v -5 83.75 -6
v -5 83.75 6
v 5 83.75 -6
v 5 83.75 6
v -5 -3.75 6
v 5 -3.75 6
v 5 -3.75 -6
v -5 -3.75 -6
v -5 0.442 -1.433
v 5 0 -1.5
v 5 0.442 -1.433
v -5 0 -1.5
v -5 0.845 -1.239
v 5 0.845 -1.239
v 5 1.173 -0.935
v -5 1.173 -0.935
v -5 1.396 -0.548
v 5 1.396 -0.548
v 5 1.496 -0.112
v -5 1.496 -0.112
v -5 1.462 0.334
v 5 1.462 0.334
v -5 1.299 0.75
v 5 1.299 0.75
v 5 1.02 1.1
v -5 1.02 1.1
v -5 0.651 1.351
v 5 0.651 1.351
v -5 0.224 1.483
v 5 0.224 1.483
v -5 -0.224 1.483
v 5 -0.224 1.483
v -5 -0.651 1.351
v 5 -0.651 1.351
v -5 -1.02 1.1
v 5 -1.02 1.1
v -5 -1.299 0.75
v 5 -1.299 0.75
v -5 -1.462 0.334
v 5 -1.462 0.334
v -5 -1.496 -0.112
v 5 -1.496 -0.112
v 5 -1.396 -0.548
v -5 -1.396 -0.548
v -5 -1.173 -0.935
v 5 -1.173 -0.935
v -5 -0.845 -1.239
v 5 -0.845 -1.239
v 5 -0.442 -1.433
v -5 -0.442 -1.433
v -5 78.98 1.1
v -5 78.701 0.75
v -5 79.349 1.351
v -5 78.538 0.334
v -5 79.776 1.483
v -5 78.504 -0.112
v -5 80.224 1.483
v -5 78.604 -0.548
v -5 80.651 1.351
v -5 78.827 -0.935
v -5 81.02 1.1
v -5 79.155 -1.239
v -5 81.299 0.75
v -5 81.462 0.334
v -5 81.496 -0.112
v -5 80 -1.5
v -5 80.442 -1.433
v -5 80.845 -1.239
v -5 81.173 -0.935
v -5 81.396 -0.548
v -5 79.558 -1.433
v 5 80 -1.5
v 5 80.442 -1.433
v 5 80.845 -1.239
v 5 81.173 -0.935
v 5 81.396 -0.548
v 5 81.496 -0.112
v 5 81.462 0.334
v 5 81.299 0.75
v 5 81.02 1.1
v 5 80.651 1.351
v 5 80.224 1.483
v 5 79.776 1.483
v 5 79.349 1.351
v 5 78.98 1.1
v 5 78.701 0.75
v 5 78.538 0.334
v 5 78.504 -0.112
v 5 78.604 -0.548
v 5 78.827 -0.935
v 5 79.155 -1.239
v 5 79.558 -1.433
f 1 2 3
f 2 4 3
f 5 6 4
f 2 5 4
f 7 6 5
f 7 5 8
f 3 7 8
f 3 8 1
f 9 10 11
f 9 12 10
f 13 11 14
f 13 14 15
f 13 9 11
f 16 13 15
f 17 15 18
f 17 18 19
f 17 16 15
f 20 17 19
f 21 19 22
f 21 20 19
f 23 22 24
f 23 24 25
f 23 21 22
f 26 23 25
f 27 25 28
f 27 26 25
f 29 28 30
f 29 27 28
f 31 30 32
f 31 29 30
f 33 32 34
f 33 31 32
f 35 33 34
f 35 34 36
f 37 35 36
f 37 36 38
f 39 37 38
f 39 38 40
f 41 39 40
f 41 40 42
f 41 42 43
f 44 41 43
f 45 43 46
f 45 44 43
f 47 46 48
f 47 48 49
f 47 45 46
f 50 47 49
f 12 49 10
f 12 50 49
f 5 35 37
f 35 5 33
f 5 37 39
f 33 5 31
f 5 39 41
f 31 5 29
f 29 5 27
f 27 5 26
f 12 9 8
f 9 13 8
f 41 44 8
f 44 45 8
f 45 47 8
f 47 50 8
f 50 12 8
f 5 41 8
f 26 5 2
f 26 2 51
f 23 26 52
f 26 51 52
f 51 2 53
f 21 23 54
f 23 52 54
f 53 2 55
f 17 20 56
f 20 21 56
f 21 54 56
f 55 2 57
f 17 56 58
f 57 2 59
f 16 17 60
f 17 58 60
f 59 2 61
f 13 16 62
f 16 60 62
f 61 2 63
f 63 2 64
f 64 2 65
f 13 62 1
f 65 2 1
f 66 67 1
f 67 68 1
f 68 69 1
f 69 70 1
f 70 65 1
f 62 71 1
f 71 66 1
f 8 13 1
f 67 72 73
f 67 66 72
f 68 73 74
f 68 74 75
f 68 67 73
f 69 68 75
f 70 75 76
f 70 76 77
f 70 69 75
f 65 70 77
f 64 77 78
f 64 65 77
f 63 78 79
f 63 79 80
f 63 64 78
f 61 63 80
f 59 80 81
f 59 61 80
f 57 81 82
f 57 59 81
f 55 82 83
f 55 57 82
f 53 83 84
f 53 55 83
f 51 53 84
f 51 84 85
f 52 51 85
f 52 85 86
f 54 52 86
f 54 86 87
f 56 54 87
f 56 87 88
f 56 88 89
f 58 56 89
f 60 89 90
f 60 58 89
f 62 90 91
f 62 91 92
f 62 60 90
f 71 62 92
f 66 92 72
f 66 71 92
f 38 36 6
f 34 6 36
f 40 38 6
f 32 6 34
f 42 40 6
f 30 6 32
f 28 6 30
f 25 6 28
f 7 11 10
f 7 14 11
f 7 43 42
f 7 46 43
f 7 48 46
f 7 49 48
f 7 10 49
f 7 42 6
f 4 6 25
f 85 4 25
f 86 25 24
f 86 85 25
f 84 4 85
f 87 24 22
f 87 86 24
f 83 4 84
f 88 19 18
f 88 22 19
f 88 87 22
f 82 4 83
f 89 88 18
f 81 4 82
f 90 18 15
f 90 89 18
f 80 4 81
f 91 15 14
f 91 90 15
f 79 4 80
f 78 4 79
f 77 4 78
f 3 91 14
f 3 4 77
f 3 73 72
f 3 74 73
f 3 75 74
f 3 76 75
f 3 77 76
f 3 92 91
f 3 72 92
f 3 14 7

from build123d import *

# Parameters (mm, degrees)
SKETCH1_W           = 12
SKETCH1_H           = 87.5
SKETCH1_R           = 1.5
BOSS_EXTRUDE1_DEPTH = 5


with BuildPart() as part:
    # Sketch1 → Boss-Extrude1 (new, symmetric)
    with BuildSketch(Plane(origin=(0, 0, 0), x_dir=(0, 0, -1), z_dir=(1, 0, 0))):
        with Locations((0, 40)):
            Rectangle(SKETCH1_W, SKETCH1_H)
        with Locations((0, 80)):
            Circle(SKETCH1_R, mode=Mode.SUBTRACT)
        Circle(SKETCH1_R, mode=Mode.SUBTRACT)
    extrude(amount=BOSS_EXTRUDE1_DEPTH, both=True)


solid = part.part
